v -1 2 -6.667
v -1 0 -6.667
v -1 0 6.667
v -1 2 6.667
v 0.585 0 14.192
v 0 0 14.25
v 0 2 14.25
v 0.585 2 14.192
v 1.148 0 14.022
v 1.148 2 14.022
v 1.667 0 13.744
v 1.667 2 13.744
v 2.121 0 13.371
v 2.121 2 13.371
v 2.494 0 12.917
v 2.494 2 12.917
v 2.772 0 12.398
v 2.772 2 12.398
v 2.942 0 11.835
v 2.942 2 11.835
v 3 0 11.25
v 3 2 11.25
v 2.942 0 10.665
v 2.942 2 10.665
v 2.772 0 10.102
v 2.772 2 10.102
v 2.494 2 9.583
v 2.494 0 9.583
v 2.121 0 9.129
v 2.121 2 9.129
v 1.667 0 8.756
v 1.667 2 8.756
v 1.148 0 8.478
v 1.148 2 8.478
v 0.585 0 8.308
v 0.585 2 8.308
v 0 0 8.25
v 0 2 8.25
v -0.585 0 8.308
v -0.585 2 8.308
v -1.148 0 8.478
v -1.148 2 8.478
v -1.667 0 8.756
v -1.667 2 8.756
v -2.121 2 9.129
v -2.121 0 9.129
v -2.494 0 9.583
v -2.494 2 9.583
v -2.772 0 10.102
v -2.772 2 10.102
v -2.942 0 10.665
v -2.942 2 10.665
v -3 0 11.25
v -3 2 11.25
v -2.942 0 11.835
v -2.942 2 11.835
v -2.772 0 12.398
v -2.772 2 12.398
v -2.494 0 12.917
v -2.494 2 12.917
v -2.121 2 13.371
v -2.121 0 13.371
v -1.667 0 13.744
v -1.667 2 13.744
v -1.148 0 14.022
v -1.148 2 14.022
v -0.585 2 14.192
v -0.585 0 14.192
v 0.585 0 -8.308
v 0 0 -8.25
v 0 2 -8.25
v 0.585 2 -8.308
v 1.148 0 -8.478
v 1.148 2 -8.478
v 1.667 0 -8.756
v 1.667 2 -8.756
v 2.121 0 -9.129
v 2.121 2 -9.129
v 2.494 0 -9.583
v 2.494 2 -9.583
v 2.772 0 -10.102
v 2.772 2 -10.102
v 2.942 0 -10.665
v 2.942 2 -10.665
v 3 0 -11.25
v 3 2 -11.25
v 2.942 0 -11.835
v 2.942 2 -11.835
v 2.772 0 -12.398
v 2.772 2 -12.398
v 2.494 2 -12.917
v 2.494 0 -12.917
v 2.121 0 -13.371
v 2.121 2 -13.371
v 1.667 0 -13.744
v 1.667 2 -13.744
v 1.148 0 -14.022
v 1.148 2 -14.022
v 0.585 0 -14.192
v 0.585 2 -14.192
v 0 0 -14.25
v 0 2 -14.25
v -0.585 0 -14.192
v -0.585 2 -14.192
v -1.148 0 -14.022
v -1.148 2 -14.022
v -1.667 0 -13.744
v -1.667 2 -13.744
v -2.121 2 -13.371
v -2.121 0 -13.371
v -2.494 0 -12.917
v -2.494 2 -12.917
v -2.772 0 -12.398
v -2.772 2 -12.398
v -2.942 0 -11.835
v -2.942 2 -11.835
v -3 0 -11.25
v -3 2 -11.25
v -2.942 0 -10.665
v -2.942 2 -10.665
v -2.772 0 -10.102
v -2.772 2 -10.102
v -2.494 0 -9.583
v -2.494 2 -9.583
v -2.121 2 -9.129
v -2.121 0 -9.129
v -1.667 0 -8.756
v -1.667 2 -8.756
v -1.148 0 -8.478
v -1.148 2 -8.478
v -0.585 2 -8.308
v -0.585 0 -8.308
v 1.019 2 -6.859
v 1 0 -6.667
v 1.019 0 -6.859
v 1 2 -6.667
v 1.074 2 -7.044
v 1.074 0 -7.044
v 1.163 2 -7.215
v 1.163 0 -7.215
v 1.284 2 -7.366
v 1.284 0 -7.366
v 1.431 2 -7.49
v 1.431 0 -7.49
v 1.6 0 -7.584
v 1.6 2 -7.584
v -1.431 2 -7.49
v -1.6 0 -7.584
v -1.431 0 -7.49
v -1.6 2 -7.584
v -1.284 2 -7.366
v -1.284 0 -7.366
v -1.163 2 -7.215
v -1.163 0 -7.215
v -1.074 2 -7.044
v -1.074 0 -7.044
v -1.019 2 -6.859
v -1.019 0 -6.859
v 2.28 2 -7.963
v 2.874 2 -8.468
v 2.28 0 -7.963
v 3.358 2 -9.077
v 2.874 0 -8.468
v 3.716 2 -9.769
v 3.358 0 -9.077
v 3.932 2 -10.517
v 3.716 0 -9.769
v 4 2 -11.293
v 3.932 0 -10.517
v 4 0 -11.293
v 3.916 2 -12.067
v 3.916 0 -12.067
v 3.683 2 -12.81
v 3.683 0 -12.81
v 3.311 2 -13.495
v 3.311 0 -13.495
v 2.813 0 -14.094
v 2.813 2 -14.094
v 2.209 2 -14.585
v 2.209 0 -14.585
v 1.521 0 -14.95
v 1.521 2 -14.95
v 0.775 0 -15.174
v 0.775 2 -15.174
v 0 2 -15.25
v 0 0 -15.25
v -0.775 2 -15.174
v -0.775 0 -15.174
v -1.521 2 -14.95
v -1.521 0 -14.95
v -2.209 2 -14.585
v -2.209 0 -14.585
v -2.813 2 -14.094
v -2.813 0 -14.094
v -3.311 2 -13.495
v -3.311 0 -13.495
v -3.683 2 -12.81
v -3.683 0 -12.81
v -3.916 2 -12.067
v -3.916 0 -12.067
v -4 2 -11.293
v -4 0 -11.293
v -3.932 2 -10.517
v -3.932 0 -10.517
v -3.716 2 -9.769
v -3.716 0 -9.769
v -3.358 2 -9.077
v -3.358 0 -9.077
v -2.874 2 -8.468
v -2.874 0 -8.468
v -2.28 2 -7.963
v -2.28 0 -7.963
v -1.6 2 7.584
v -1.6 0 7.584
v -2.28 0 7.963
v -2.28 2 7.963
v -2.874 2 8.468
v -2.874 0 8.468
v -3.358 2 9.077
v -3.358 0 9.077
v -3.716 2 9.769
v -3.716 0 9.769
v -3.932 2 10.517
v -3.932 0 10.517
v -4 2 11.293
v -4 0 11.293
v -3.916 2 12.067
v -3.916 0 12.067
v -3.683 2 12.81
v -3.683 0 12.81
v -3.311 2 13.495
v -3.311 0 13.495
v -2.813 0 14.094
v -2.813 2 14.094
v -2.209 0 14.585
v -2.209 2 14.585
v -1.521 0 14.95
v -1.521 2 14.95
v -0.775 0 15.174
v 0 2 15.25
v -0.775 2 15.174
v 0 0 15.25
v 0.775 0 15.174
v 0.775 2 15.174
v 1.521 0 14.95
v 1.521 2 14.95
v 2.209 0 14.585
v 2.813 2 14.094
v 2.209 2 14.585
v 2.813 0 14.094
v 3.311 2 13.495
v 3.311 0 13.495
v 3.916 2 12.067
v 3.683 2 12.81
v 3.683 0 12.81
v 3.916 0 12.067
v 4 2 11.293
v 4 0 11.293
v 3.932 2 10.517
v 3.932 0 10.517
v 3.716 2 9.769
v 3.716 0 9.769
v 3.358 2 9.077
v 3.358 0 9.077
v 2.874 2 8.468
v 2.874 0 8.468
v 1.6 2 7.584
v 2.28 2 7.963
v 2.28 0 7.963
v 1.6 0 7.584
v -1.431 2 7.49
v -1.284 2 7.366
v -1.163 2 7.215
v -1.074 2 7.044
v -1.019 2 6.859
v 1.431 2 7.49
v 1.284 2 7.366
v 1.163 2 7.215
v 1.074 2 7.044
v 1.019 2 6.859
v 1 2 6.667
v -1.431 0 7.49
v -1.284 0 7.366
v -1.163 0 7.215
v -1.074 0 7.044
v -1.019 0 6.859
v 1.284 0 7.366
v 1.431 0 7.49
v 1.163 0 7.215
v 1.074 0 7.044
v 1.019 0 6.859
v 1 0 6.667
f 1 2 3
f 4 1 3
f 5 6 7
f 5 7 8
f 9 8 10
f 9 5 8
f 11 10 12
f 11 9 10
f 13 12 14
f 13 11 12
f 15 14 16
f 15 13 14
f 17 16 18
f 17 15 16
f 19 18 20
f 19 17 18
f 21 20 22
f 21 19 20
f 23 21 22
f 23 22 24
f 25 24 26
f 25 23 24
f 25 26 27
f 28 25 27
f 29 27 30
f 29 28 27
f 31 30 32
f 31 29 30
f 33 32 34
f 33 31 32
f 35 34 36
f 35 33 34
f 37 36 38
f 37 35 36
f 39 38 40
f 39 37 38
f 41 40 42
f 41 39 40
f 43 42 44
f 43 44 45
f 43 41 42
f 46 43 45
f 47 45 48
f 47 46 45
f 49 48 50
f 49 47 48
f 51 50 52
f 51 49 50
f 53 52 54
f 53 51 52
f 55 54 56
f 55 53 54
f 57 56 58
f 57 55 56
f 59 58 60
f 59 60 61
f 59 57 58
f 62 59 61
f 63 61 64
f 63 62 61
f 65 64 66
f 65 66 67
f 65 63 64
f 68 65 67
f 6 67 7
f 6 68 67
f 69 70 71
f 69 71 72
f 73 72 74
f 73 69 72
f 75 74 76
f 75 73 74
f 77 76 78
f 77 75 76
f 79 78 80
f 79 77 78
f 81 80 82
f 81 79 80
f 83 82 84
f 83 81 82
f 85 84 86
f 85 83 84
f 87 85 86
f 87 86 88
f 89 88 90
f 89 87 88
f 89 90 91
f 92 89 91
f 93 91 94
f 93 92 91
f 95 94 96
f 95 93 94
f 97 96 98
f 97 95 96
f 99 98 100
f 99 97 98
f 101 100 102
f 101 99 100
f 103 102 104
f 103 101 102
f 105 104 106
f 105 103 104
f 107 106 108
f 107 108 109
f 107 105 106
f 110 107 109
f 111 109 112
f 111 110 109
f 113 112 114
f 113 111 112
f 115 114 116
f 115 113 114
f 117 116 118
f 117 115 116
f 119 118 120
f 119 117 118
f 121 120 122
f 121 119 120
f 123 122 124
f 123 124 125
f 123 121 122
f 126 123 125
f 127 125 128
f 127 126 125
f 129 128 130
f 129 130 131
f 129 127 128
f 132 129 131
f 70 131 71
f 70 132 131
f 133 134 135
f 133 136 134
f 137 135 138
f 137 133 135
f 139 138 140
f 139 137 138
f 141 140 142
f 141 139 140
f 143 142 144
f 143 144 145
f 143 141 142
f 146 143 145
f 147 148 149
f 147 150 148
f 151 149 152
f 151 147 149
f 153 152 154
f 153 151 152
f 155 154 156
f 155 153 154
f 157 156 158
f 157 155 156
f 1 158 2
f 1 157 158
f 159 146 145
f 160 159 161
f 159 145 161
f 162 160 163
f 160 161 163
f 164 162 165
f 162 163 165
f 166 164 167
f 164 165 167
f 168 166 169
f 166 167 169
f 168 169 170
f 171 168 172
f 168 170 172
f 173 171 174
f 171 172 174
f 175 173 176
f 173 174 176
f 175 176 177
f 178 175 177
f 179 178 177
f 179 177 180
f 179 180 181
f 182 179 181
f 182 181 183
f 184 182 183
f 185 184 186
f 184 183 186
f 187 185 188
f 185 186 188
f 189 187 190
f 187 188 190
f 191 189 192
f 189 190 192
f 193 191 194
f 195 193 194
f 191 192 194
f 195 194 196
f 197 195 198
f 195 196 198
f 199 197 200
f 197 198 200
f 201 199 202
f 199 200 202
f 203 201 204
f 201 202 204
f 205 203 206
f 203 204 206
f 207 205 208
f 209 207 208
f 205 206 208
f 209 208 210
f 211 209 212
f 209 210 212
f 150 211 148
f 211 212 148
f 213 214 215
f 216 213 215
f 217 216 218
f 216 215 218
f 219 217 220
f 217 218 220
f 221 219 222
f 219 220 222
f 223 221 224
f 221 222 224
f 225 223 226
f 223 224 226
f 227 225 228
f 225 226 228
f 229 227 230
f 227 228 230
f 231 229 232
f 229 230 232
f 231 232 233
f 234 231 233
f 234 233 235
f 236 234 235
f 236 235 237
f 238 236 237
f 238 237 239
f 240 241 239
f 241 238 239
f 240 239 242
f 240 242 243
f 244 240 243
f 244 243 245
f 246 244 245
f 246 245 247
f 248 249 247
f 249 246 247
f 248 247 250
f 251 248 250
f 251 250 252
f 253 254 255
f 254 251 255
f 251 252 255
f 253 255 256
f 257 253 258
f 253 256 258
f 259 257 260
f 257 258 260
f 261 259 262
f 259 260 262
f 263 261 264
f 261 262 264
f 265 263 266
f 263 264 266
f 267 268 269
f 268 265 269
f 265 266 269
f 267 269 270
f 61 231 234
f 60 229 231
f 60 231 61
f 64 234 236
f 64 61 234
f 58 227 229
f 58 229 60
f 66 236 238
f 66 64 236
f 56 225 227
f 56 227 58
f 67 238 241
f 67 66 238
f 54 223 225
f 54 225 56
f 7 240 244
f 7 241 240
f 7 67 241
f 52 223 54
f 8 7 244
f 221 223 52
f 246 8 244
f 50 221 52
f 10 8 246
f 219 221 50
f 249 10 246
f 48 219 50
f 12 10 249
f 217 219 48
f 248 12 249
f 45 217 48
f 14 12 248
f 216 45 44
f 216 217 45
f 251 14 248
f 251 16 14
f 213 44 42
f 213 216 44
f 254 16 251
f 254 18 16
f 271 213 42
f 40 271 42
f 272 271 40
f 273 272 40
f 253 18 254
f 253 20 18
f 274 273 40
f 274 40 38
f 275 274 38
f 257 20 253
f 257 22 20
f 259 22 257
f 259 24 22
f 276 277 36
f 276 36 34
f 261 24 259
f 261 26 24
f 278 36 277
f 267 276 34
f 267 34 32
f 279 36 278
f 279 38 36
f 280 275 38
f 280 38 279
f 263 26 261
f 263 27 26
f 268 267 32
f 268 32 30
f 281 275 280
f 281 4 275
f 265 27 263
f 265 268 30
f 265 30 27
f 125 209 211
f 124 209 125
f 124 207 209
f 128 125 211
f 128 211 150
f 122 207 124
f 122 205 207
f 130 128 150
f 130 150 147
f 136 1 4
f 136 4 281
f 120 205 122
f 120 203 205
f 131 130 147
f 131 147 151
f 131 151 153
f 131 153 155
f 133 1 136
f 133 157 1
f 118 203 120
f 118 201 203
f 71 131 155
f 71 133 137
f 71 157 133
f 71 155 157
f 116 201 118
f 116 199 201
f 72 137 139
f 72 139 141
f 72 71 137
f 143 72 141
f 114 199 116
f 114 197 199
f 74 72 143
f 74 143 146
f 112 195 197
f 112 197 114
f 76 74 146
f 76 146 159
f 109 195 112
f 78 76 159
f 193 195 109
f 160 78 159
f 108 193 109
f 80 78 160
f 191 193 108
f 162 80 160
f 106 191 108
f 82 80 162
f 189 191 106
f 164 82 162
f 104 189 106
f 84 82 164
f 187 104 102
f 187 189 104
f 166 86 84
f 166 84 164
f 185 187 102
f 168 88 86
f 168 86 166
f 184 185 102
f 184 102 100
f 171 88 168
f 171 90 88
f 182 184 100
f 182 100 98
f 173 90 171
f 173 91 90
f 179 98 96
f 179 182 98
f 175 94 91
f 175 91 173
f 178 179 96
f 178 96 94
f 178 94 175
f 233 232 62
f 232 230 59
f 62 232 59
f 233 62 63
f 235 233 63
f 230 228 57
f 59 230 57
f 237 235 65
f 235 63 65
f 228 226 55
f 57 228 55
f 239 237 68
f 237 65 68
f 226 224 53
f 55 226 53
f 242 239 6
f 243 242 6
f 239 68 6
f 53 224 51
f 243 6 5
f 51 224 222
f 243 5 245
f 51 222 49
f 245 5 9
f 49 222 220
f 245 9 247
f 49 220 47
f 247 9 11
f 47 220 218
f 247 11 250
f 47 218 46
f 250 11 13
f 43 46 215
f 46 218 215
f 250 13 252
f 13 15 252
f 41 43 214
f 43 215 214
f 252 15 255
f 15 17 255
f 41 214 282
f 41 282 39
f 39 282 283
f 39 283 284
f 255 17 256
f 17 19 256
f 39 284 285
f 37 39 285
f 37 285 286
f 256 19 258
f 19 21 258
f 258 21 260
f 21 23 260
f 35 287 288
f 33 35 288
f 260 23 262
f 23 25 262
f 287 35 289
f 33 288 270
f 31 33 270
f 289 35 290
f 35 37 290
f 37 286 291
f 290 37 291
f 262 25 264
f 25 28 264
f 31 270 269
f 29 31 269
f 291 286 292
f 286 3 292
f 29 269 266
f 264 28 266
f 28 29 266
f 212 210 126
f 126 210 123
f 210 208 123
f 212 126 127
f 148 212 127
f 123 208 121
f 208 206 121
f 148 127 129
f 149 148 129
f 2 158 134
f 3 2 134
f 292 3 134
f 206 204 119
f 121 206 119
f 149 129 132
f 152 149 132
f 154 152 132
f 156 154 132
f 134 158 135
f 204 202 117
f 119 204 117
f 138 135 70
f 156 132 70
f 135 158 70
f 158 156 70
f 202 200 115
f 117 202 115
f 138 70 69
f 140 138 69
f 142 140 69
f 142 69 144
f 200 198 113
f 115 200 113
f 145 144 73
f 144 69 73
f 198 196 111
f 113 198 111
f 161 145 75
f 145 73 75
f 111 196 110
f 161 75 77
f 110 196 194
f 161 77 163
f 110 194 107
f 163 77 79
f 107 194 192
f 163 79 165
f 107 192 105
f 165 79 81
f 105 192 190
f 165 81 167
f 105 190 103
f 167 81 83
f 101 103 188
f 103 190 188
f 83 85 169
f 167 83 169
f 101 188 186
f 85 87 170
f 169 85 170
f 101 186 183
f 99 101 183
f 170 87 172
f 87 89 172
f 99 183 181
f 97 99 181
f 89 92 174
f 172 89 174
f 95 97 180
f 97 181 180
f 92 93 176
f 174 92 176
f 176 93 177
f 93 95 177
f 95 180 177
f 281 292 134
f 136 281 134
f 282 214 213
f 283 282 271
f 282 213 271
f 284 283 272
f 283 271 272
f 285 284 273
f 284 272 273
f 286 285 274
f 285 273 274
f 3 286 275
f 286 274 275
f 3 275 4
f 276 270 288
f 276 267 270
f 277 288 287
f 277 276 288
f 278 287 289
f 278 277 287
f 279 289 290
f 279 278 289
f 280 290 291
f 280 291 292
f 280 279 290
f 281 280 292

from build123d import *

# Parameters (mm, degrees)
SKETCH1_R           = 4
SKETCH1_R_2         = 3
BOSS_EXTRUDE1_DEPTH = 2
FILLET1_R           = 1


with BuildPart() as part:
    # Sketch1 → Boss-Extrude1 (new body)
    # profile 1 of 3: a face of its own
    with BuildSketch(Plane(origin=(0, 0, 0), x_dir=(1, 0, 0), z_dir=(0, 1, 0))):
        with Locations((0, 11.25)):
            Circle(SKETCH1_R)
        with Locations(Location((0, 11.25, 0), (0, 0, 270))):
            Circle(SKETCH1_R_2, mode=Mode.SUBTRACT)
    # profile 2 of 3: a face of its own
    with BuildSketch(Plane(origin=(0, 0, 0), x_dir=(1, 0, 0), z_dir=(0, 1, 0))):
        with BuildLine():
            Line((-1, 7.377016654), (-1, -7.377016654))
            ThreePointArc((-1, -7.377016654), (0, -7.25), (1, -7.377016654))
            Line((1, -7.377016654), (1, 7.377016654))
            ThreePointArc((1, 7.377016654), (0, 7.25), (-1, 7.377016654))
        make_face()
    # profile 3 of 3: a face of its own
    with BuildSketch(Plane(origin=(0, 0, 0), x_dir=(1, 0, 0), z_dir=(0, 1, 0))):
        with Locations((0, -11.25)):
            Circle(SKETCH1_R)
        with Locations(Location((0, -11.25, 0), (0, 0, 270))):
            Circle(SKETCH1_R_2, mode=Mode.SUBTRACT)
    extrude(amount=BOSS_EXTRUDE1_DEPTH)

    # Fillet1
    fillet1_edges = [part.edges().sort_by_distance(p)[0] for p in [
        (1, 1, -7.377016654),
        (1, 1, 7.377016654),
        (-1, 1, 7.377016654),
        (-1, 1, -7.377016654),
    ]]
    fillet(fillet1_edges, radius=FILLET1_R)


solid = part.part
